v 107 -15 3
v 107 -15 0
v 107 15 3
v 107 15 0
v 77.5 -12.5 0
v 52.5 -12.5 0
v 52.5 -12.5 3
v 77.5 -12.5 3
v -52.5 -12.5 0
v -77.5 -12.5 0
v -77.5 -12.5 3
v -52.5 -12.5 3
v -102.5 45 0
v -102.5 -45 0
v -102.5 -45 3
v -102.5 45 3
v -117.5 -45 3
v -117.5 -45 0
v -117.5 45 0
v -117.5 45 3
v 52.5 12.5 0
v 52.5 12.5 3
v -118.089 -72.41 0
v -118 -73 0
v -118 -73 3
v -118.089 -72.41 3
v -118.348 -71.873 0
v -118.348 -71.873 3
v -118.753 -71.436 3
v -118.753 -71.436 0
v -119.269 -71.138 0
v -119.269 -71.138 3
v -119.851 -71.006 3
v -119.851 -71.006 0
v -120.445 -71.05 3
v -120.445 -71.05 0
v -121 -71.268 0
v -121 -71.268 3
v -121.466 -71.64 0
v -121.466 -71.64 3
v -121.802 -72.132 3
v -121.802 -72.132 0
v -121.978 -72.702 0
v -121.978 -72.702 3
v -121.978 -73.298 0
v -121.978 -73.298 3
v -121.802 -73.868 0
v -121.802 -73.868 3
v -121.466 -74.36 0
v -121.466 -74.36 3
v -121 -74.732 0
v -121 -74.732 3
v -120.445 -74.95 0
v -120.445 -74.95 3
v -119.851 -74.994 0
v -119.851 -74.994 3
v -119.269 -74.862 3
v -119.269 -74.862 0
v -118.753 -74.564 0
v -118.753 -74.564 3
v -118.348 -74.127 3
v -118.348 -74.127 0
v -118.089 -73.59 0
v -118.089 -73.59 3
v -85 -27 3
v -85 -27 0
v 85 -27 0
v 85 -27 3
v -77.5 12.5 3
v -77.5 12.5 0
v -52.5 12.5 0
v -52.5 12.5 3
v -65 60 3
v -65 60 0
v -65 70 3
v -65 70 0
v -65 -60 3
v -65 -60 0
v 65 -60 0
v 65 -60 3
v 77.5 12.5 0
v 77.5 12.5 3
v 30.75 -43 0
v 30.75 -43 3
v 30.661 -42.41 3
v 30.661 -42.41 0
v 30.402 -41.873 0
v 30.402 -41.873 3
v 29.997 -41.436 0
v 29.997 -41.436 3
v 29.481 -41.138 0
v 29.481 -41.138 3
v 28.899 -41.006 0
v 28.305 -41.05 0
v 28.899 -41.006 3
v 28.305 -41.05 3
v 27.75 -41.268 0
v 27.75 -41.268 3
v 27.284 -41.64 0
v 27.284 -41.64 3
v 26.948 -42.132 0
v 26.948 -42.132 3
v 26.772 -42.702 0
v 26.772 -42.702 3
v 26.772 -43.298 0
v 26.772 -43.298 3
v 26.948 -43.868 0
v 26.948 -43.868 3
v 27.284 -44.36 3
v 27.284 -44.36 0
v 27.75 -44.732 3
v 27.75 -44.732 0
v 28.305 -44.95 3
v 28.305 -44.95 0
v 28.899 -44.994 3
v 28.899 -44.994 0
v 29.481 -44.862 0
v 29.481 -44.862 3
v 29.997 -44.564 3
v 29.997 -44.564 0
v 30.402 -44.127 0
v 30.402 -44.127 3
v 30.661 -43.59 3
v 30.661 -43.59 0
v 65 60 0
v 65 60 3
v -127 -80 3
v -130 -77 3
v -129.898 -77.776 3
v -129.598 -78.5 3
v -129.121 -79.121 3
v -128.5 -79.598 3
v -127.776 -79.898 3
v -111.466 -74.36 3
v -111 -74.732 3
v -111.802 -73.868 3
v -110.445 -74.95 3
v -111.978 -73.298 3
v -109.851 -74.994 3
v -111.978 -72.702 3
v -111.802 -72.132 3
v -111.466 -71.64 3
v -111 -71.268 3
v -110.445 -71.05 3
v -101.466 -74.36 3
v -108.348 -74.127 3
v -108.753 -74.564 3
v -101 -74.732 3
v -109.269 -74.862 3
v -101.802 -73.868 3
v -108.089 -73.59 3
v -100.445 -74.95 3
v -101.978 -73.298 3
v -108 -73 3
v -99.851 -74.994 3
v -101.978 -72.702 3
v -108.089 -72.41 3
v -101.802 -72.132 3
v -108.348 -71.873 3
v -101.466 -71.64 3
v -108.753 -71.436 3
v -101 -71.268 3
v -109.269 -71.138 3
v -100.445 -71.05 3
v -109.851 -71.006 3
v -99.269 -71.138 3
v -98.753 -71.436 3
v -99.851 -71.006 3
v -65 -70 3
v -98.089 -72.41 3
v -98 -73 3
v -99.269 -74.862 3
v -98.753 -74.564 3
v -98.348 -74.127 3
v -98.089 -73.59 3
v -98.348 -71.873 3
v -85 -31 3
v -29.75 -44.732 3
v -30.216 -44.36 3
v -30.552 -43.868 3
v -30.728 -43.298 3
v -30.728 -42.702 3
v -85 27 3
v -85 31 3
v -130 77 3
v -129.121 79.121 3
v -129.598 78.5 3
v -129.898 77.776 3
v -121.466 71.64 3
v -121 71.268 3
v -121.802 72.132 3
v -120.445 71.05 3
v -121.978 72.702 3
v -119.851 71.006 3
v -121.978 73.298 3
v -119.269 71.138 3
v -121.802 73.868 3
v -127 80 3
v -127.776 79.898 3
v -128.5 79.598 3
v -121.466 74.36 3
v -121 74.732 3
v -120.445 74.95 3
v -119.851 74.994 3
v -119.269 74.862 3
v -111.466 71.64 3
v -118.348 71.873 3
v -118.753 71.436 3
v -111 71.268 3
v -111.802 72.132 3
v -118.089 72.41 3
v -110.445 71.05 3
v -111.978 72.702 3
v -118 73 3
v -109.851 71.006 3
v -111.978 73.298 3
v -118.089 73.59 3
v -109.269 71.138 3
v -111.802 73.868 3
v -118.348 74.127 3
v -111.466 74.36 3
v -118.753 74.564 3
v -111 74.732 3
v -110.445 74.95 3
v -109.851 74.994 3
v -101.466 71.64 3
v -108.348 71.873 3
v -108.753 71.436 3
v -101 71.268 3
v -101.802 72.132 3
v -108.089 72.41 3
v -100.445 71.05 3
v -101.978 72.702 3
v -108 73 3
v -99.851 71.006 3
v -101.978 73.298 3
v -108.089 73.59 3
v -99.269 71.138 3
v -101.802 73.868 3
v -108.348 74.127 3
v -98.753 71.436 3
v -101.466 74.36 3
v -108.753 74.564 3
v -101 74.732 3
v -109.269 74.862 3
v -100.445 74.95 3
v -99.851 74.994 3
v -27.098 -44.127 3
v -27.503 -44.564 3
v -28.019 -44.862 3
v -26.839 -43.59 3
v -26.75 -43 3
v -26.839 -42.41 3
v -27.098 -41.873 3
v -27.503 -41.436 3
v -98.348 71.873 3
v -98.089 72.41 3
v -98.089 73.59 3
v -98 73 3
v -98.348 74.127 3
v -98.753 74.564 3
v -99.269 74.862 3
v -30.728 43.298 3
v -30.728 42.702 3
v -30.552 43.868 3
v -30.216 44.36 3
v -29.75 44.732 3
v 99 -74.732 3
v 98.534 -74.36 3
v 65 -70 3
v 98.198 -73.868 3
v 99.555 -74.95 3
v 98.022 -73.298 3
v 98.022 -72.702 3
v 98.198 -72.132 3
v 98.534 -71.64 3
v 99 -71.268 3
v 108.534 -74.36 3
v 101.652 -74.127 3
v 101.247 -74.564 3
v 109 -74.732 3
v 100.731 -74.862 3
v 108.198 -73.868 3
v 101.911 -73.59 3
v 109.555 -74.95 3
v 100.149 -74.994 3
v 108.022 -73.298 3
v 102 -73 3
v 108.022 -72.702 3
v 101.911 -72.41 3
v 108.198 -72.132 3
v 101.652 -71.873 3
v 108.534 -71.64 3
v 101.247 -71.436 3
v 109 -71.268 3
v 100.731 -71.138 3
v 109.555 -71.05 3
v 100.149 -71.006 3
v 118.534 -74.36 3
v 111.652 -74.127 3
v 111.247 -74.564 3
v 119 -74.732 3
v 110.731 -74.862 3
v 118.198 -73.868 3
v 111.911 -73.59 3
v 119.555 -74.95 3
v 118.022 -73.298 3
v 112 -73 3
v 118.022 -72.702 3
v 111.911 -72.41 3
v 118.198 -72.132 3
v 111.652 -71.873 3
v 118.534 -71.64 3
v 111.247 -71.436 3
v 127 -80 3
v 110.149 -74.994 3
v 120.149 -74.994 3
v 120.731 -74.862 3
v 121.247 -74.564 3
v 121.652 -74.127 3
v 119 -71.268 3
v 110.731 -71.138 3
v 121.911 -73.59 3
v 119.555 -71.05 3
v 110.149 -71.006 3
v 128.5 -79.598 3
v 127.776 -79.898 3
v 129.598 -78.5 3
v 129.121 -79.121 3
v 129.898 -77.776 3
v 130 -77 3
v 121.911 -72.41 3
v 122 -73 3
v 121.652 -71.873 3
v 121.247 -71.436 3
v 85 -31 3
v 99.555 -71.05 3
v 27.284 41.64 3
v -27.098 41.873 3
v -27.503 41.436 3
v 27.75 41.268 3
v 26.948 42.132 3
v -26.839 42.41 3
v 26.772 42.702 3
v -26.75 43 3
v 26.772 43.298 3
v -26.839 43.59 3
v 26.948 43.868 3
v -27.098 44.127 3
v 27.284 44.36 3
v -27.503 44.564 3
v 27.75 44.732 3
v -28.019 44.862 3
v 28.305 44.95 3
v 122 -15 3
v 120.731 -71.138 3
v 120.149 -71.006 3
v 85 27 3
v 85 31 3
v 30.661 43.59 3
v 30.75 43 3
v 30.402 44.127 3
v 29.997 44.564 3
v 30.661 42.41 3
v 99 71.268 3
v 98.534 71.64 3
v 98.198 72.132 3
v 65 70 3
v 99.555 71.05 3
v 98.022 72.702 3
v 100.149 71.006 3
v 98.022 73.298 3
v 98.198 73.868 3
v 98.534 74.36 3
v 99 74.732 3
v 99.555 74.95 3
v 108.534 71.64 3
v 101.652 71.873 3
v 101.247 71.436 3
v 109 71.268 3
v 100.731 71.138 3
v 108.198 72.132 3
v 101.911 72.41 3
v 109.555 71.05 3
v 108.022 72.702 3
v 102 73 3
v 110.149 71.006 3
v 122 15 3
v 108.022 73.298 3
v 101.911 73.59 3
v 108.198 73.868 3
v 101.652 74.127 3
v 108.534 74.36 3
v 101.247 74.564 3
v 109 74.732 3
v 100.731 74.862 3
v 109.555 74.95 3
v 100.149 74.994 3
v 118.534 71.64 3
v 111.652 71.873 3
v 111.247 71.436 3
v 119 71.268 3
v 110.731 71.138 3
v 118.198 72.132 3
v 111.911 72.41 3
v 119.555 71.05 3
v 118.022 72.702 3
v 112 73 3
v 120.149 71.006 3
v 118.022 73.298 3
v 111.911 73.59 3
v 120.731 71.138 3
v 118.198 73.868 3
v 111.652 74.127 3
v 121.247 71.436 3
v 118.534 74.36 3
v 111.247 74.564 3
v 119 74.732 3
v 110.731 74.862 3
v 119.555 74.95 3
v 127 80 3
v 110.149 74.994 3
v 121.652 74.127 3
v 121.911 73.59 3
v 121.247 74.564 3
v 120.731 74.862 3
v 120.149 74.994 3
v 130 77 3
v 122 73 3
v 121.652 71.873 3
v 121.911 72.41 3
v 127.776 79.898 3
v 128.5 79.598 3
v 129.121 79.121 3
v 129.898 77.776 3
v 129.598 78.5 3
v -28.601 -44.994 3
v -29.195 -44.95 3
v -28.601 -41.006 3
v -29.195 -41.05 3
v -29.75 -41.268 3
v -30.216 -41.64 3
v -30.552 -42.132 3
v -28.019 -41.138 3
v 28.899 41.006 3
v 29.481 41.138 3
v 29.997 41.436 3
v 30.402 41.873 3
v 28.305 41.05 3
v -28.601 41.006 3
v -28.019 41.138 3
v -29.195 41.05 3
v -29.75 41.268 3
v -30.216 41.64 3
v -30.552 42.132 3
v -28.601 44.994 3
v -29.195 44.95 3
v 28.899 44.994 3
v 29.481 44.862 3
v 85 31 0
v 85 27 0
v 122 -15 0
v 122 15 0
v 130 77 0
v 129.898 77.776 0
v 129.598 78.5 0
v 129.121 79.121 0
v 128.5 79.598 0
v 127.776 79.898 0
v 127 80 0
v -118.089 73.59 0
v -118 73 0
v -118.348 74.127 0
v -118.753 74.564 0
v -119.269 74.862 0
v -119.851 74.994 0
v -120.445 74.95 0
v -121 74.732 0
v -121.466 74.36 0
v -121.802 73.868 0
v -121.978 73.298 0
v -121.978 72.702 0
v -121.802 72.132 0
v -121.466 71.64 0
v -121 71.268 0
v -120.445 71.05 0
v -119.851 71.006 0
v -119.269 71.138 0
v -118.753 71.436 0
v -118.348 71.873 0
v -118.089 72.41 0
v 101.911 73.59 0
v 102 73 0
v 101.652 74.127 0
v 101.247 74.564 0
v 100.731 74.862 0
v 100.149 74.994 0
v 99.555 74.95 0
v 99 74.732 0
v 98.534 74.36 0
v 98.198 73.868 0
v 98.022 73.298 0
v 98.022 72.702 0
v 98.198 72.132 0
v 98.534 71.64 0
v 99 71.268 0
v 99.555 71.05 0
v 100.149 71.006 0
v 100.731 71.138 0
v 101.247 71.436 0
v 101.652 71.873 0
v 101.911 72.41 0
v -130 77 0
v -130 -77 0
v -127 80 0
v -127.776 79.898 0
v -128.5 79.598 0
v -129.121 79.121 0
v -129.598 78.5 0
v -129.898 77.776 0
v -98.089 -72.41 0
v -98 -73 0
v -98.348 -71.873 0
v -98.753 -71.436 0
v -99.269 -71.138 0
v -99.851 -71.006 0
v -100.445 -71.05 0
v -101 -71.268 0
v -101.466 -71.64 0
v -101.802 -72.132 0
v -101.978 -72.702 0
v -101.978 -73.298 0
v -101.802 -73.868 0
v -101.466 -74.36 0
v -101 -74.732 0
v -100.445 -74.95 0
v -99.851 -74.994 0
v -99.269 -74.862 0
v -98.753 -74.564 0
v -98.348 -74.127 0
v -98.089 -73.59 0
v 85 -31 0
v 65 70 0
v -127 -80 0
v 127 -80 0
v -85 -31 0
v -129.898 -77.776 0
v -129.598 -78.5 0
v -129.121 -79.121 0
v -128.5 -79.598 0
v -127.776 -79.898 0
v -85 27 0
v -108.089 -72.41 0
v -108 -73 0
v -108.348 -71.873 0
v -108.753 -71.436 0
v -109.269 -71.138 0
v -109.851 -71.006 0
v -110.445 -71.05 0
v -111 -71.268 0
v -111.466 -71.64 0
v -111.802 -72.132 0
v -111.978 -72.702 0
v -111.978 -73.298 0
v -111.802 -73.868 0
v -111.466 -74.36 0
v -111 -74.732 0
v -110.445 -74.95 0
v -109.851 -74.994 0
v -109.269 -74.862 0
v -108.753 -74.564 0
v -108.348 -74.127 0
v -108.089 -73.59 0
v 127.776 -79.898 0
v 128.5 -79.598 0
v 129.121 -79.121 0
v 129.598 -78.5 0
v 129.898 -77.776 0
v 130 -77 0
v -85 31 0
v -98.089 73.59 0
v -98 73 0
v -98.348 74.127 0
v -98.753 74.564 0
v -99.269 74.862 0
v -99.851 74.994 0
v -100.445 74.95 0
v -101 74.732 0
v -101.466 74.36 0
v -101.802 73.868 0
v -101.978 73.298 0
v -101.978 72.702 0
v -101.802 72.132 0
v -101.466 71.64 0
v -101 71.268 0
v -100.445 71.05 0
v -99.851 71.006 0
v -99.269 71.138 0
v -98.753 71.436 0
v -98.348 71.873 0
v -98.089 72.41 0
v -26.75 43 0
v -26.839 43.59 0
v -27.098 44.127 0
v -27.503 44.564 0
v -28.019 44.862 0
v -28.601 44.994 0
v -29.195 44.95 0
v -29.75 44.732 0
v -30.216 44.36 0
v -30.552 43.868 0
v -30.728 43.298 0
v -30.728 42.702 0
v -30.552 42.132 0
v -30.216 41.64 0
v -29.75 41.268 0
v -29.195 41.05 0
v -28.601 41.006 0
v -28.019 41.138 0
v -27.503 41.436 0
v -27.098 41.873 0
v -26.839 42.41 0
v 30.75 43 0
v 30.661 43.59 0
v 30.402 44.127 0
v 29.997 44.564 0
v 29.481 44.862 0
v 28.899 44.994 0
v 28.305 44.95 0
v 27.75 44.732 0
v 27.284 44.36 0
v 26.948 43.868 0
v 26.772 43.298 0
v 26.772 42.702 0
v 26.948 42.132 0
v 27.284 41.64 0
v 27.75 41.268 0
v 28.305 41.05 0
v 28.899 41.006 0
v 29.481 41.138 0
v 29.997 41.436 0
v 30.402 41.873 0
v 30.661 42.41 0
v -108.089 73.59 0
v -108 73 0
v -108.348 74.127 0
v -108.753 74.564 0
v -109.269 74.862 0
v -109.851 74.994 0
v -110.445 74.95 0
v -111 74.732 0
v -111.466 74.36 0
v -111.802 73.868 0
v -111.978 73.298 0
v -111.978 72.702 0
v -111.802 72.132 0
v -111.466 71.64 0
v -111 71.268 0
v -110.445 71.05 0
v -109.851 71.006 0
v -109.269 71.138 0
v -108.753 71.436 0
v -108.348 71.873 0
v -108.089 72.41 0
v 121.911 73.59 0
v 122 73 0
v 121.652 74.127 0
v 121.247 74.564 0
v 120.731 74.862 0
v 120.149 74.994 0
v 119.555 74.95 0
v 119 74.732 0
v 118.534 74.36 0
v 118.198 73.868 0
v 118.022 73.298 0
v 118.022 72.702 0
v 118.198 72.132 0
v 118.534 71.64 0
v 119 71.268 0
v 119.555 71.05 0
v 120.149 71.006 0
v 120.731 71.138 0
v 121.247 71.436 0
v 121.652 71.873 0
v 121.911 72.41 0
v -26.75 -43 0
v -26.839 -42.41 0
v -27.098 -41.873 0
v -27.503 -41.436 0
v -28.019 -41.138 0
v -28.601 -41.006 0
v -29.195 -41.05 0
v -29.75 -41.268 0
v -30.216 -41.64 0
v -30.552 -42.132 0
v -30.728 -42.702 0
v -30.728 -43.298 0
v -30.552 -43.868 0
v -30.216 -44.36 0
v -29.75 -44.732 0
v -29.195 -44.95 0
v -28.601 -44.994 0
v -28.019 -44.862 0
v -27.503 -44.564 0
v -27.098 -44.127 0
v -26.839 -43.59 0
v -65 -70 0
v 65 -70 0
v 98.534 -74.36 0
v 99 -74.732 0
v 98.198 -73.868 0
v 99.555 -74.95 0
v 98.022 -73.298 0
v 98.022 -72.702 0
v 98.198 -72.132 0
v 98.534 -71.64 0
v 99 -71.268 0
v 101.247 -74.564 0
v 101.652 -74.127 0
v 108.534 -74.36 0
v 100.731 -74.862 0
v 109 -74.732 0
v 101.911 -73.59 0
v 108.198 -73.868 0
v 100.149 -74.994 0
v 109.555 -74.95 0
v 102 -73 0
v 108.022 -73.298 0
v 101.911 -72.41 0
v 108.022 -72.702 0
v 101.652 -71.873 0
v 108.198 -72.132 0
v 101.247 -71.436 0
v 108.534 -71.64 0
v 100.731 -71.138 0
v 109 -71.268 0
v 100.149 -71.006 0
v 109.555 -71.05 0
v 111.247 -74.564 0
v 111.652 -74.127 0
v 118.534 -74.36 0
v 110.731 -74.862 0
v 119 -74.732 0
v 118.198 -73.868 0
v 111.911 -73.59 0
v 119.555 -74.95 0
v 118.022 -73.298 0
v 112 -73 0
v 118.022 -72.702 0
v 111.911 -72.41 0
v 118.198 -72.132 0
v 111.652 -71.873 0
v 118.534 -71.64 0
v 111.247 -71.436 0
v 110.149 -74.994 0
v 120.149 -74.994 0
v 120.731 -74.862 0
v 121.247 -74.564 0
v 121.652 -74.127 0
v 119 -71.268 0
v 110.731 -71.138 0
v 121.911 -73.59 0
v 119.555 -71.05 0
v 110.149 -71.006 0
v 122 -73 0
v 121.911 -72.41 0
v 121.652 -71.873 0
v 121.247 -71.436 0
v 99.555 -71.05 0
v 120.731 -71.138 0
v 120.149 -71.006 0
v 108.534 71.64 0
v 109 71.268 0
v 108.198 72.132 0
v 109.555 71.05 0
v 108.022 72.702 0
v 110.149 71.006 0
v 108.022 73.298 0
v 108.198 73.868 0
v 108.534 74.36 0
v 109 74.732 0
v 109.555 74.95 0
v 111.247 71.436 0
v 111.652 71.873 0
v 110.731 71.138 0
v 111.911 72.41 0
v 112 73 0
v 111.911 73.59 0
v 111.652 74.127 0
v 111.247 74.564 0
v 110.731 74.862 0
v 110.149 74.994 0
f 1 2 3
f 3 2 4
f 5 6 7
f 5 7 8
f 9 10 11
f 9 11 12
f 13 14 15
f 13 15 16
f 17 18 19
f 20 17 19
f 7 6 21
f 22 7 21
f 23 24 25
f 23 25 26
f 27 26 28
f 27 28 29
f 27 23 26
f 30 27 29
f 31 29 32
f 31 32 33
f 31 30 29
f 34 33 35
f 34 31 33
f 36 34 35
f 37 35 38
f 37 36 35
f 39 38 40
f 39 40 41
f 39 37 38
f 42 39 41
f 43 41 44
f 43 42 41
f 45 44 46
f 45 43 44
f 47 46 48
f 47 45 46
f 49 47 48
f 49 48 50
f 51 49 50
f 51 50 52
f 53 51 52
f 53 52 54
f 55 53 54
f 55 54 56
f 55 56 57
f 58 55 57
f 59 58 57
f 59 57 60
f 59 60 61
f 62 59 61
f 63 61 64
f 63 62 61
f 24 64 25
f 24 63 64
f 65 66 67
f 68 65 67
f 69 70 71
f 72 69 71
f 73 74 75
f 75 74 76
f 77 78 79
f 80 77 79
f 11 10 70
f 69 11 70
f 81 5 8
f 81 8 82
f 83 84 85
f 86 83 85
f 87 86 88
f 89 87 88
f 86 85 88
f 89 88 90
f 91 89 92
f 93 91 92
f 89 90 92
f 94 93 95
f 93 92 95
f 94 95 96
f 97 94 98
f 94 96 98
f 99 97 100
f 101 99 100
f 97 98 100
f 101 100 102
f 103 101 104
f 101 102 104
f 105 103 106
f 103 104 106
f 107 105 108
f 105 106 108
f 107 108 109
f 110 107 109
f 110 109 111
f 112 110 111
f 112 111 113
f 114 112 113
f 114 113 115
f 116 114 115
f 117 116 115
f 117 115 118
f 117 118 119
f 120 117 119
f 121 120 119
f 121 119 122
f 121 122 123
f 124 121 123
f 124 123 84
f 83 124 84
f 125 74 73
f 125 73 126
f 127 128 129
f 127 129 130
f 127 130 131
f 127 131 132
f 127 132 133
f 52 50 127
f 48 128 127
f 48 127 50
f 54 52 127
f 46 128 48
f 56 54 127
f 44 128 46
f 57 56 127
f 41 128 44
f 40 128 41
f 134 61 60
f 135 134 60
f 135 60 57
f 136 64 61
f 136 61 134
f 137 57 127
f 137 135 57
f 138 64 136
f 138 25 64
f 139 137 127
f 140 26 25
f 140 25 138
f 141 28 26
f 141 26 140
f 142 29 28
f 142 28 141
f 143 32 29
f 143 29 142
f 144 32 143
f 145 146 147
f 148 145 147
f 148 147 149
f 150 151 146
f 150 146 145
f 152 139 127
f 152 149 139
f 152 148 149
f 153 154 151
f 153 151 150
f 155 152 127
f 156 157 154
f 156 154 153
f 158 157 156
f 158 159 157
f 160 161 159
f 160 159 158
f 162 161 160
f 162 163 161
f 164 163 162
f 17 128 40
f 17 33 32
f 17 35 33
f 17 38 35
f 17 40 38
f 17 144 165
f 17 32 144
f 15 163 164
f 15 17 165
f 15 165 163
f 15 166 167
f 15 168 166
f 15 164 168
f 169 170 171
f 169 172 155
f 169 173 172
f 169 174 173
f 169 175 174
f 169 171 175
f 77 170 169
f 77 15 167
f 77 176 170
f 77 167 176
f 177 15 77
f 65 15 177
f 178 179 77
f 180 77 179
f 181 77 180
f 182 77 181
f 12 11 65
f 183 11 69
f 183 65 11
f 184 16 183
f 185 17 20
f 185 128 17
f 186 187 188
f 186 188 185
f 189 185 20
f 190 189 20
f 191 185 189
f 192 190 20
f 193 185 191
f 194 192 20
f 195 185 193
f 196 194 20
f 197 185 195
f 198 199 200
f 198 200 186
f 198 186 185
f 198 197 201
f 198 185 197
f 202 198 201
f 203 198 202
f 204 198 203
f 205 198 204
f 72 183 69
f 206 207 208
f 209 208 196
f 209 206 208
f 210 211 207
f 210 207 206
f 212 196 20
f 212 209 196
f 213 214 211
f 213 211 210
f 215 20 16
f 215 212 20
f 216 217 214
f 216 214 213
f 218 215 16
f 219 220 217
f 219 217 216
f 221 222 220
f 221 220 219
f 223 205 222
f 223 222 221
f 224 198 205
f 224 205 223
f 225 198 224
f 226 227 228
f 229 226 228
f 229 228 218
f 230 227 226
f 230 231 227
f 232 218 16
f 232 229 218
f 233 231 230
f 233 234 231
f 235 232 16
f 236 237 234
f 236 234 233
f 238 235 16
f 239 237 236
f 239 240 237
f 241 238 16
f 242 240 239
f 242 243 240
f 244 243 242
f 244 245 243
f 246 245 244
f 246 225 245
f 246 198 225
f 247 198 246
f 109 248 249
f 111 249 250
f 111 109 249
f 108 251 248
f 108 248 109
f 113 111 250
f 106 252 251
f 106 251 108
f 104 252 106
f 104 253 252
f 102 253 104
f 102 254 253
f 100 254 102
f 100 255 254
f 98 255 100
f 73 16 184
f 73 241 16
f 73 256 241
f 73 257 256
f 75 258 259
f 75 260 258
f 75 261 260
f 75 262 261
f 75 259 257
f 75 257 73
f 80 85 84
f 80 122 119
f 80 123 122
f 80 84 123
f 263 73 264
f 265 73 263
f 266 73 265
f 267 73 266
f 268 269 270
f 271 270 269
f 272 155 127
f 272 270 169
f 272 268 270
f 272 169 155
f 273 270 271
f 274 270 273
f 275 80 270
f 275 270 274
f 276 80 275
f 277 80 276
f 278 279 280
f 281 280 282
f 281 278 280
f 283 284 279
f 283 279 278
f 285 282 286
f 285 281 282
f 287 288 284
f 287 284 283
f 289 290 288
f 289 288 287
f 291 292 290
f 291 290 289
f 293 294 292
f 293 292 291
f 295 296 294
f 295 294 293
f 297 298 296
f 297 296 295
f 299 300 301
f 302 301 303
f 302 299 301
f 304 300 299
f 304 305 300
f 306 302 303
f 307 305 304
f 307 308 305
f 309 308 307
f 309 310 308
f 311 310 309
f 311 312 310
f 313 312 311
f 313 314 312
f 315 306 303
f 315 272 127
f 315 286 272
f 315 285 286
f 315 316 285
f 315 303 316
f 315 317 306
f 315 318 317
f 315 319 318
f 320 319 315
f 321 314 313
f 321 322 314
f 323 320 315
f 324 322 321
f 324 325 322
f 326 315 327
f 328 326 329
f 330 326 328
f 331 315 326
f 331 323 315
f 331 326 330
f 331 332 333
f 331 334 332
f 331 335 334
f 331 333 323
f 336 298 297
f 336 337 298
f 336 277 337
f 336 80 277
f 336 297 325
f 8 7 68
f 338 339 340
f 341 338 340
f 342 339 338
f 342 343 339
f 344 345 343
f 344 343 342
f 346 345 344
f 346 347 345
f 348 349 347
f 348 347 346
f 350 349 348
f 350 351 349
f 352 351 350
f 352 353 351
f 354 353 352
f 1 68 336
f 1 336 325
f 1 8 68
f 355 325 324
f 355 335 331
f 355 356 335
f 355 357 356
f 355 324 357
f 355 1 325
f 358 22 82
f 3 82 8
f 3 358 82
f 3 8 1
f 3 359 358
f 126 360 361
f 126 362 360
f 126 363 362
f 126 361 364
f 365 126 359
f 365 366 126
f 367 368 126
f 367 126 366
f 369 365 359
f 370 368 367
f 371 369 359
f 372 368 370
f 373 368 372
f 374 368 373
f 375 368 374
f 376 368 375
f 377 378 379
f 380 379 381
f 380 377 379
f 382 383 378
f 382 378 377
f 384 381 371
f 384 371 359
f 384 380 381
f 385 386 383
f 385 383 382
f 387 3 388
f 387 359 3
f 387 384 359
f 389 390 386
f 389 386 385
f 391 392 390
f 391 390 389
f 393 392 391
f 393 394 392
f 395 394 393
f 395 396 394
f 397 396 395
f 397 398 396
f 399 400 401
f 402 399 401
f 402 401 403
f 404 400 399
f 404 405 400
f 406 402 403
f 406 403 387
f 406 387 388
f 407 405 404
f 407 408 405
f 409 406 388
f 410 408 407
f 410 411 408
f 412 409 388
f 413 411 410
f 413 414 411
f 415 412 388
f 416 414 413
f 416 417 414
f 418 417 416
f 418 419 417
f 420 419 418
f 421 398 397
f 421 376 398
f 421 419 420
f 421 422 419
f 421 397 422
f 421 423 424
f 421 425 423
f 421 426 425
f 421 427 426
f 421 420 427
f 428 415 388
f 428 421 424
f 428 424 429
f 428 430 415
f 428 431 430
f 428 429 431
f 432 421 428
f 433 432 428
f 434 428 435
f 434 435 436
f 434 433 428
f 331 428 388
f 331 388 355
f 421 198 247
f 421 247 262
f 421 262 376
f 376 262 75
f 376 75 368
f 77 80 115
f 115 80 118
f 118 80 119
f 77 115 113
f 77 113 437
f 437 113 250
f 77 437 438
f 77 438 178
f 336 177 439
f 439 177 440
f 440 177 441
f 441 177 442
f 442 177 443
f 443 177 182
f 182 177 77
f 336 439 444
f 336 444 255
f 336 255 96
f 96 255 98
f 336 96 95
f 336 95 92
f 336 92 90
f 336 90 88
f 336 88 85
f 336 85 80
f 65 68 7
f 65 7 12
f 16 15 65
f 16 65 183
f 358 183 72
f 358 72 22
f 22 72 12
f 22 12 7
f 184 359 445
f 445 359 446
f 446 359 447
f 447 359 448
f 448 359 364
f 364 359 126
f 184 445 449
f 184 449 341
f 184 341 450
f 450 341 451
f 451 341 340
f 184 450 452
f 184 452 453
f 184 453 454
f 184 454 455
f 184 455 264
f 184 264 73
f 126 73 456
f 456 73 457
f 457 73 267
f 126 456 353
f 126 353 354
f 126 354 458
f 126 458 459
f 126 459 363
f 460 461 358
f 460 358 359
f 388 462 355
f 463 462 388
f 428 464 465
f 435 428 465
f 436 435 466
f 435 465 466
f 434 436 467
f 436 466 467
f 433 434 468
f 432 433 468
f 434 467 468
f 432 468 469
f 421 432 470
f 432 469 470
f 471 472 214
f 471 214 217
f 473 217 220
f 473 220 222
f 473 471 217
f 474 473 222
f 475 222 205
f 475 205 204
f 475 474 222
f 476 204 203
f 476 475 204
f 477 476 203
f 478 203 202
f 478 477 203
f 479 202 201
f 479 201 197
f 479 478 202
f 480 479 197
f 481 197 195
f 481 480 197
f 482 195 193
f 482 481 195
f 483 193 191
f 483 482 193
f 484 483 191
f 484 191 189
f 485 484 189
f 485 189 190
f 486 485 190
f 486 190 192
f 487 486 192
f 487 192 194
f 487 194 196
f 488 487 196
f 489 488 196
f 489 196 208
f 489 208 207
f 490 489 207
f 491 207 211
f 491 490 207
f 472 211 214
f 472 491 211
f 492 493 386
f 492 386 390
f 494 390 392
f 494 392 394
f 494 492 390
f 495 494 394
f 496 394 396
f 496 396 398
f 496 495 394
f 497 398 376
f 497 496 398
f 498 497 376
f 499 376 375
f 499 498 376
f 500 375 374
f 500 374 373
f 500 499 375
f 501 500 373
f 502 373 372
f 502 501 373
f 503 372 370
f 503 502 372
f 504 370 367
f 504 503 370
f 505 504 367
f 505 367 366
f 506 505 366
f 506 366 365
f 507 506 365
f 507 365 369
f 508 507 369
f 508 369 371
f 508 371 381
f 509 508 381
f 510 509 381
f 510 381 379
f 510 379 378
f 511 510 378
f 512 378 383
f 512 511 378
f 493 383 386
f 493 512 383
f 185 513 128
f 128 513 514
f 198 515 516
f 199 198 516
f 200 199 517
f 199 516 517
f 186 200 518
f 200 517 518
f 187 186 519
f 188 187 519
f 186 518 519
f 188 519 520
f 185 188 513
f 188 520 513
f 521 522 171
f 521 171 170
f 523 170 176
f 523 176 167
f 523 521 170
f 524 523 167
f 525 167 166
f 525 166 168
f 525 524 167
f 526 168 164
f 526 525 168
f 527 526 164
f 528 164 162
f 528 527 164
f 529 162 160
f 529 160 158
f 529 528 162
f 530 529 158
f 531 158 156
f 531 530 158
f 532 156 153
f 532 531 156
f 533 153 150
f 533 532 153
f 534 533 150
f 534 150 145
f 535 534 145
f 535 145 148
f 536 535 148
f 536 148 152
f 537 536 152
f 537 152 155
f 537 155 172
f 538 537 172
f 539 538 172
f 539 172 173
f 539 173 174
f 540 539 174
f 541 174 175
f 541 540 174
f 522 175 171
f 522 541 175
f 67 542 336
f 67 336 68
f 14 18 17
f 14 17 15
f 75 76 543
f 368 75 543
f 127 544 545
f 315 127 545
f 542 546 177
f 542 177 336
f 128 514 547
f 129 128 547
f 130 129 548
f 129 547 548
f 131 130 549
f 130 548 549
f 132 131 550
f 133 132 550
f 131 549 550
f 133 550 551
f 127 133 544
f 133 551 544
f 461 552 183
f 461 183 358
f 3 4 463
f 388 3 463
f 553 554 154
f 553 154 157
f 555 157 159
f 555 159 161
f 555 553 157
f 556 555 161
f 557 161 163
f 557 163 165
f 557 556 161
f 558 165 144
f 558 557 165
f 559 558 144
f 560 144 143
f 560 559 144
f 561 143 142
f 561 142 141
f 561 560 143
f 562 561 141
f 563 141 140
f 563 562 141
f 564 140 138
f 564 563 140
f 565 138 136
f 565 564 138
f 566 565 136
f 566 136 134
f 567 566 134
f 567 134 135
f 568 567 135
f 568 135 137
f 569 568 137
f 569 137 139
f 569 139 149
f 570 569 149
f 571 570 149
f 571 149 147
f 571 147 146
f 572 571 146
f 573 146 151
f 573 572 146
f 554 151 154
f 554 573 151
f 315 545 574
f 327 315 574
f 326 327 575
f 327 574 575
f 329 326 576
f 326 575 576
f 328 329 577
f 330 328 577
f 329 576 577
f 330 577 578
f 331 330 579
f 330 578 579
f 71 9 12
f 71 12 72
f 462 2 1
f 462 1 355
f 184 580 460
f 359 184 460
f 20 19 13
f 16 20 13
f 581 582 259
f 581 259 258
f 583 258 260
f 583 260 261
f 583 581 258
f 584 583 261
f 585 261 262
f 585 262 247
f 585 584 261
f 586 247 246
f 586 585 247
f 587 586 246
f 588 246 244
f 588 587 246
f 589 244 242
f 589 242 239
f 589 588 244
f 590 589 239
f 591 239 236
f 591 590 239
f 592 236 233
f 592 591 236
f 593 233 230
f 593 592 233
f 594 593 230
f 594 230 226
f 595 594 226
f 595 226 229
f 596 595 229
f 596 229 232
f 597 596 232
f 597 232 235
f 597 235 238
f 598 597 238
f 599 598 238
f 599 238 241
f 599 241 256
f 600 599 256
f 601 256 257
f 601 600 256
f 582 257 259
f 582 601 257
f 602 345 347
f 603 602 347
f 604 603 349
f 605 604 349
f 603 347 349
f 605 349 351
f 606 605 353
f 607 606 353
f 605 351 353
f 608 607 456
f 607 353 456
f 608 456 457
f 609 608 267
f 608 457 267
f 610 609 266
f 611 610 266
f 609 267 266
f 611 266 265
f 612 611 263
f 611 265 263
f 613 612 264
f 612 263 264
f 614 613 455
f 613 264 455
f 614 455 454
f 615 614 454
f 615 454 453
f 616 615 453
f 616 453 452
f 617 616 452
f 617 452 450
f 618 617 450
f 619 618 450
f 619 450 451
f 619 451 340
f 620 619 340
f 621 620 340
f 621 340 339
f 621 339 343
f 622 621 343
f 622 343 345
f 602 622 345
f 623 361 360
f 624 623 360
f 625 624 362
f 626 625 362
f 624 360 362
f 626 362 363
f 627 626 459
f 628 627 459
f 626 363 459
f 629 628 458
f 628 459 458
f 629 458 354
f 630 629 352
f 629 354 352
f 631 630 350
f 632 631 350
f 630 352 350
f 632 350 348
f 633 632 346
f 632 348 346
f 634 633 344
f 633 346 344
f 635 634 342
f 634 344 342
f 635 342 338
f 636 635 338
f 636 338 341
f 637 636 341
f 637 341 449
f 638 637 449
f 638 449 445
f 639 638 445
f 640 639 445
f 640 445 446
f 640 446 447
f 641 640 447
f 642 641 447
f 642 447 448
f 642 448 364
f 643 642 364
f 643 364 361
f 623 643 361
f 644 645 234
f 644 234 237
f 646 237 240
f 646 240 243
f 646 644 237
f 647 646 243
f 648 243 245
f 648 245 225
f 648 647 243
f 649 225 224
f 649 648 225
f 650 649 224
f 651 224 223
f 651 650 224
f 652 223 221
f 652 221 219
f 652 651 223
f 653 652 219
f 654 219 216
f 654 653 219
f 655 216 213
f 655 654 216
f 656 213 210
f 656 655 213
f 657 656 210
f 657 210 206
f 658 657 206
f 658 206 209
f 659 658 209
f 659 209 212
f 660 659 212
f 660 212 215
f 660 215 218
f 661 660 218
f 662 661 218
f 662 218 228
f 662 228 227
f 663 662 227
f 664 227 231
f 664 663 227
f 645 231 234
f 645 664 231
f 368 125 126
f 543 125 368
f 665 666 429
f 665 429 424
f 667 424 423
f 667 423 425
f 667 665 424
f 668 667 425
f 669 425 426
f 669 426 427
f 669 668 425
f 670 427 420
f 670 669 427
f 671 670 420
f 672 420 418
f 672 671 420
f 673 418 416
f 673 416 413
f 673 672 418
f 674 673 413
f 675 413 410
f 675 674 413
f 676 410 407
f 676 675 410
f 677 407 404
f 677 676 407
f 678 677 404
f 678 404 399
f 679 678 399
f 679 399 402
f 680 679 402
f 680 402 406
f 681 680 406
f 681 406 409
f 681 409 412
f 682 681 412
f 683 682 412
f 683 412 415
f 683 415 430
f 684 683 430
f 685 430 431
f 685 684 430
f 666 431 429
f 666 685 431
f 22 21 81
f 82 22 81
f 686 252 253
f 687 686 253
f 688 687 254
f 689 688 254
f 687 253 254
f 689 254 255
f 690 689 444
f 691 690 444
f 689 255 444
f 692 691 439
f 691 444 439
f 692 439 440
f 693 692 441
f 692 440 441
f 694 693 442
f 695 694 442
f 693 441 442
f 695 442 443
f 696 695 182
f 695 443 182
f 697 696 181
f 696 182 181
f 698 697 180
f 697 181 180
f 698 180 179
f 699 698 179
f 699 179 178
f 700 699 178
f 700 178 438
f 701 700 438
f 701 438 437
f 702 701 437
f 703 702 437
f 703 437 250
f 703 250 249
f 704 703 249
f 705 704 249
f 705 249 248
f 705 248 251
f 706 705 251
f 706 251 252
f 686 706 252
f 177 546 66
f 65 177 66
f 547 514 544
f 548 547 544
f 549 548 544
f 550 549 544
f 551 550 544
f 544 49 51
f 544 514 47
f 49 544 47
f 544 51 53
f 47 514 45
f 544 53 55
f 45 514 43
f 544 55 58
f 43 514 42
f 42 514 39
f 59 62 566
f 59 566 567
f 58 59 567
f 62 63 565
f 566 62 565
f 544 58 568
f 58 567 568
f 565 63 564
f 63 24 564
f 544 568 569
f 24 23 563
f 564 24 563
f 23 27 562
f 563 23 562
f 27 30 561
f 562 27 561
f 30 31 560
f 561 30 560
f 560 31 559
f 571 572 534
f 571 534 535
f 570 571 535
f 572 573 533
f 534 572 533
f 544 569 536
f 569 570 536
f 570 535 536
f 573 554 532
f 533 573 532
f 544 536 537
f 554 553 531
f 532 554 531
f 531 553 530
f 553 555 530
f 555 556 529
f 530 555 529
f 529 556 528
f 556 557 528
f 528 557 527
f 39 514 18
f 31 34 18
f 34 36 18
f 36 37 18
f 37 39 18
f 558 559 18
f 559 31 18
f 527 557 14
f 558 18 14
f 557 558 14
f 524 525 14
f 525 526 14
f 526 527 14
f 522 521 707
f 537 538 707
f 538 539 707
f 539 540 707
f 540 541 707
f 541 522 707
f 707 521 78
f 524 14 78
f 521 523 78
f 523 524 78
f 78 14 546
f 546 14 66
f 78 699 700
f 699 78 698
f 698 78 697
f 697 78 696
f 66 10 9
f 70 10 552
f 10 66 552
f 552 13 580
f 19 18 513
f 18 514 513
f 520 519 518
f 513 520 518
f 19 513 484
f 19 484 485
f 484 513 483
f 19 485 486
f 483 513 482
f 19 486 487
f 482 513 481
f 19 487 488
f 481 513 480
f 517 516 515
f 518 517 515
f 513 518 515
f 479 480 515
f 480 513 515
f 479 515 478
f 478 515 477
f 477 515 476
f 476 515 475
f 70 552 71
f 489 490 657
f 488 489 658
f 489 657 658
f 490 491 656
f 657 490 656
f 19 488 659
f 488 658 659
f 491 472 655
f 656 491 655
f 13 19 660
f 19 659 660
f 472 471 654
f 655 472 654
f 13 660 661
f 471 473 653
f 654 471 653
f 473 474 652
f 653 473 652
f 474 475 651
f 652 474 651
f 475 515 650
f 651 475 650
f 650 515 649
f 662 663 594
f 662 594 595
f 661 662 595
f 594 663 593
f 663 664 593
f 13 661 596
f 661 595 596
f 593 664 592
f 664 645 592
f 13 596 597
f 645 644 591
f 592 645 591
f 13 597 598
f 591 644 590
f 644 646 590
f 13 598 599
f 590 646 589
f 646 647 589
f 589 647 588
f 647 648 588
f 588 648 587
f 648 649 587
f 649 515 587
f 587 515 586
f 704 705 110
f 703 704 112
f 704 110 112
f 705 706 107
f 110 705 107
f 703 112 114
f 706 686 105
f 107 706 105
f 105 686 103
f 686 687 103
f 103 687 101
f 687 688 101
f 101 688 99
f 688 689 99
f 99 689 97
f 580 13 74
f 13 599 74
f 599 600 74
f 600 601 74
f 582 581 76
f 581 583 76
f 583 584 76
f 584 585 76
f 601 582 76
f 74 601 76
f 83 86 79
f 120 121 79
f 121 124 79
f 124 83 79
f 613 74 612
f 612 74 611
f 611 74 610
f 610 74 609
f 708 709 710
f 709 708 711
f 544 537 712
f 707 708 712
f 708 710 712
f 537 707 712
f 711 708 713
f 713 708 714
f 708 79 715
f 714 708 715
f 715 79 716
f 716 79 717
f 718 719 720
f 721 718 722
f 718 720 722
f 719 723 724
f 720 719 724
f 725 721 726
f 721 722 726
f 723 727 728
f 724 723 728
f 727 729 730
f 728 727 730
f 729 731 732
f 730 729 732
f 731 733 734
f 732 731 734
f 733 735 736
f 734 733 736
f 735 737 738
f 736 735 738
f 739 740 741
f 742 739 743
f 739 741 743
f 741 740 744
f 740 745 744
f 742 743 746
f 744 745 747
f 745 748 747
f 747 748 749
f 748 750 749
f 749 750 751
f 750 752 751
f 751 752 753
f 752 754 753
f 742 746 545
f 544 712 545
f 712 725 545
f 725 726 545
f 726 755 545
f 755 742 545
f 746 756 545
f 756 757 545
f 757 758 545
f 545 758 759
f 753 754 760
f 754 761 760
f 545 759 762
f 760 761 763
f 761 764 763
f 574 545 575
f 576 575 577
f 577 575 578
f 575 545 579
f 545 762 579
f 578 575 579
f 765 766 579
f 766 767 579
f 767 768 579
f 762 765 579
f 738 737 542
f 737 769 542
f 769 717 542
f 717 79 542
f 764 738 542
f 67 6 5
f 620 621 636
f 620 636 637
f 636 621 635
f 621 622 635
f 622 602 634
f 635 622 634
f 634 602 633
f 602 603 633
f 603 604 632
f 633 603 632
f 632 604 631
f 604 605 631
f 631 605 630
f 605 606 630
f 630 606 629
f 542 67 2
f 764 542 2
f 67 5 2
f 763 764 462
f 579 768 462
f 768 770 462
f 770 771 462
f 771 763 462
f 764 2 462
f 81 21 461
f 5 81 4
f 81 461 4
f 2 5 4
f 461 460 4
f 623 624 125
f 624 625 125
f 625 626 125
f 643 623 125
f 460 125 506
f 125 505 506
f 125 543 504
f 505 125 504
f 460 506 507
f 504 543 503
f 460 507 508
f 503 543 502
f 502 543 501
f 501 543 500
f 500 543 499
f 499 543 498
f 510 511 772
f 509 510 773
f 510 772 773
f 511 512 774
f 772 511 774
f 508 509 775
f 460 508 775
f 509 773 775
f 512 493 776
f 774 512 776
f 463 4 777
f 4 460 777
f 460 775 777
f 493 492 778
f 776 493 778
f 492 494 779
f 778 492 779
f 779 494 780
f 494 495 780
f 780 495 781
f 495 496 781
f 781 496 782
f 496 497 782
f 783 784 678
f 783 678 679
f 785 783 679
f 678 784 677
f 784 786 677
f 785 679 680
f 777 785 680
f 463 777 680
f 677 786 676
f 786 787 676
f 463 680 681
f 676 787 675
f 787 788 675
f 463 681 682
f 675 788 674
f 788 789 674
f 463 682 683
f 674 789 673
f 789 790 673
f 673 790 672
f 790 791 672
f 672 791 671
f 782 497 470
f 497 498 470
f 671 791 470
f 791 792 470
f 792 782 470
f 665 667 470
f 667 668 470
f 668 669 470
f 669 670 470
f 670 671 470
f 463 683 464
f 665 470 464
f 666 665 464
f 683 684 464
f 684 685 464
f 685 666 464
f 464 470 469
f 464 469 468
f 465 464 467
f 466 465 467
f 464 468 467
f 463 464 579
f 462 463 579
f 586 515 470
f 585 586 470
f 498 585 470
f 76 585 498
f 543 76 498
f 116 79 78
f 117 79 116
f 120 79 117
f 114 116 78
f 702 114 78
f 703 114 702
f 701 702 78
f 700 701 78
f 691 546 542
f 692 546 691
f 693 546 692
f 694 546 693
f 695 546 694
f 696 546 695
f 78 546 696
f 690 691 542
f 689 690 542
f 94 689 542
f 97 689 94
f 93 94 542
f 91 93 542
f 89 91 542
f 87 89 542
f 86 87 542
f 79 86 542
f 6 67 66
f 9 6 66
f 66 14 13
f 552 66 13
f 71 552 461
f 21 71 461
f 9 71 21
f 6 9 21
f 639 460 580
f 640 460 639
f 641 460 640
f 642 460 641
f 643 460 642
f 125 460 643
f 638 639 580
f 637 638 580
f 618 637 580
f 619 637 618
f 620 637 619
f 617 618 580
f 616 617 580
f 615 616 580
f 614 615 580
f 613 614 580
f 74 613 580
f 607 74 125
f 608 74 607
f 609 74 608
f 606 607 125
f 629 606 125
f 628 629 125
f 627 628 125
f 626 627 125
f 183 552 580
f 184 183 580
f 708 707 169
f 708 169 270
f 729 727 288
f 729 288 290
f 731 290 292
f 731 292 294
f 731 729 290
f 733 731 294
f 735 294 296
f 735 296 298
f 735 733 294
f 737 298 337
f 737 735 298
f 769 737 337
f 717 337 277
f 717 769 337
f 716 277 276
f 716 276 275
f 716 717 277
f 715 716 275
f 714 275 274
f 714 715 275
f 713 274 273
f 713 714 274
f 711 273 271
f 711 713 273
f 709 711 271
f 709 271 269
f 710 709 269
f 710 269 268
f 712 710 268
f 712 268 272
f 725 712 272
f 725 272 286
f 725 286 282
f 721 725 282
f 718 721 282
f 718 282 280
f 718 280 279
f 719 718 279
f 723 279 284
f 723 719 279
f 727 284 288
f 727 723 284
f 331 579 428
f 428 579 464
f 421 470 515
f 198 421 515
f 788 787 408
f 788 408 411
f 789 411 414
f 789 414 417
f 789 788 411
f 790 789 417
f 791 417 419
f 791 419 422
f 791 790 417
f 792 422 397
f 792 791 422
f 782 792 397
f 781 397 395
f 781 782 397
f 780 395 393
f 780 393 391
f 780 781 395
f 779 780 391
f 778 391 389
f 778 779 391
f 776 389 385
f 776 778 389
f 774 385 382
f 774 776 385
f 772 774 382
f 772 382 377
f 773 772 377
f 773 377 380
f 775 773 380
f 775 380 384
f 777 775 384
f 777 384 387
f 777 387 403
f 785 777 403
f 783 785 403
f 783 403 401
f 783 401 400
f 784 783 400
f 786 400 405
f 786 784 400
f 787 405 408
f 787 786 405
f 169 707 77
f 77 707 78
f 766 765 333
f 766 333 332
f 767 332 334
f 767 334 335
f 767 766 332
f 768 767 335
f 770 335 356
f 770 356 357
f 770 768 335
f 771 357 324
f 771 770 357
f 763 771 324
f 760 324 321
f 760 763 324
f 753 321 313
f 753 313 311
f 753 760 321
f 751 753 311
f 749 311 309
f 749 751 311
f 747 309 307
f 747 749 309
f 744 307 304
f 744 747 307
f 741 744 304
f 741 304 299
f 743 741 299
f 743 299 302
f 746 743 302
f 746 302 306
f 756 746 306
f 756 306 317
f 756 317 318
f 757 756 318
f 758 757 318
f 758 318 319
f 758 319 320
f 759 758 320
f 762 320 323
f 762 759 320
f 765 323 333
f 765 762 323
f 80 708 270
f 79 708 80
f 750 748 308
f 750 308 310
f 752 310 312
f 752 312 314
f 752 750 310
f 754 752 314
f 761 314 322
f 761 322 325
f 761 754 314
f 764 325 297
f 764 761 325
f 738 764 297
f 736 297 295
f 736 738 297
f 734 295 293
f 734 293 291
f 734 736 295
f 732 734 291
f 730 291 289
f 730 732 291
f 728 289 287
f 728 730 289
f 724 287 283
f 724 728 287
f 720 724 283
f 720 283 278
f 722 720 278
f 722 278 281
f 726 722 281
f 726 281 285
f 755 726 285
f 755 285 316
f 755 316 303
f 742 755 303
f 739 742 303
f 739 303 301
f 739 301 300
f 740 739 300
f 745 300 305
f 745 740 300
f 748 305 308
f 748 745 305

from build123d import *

# Parameters (mm, degrees)
MODEL_R             = 2
MODEL_W             = 130
MODEL_H             = 10
MODEL_W_2           = 15
MODEL_H_2           = 90
MODEL_W_3           = 25
MODEL_H_3           = 25
MODEL_H_4           = 30
MODEL_W_4           = 170
MODEL_H_5           = 4
EXTRUDE_1_DEPTH     = 3
SKETCH_1_R          = 2
CUT_EXTRUDE_1_DEPTH = 10


with BuildPart() as part:
    # Model → 凸台-拉伸1 (new body)
    with BuildSketch(Plane.XY):
        with BuildLine():
            Line((130, -77), (130, 77))
            ThreePointArc((130, 77), (129.121320344, 79.121320344), (127, 80))
            Line((127, 80), (-127, 80))
            ThreePointArc((-127, 80), (-129.121320344, 79.121320344), (-130, 77))
            Line((-130, 77), (-130, -77))
            ThreePointArc((-130, -77), (-129.121320344, -79.121320344), (-127, -80))
            Line((-127, -80), (127, -80))
            ThreePointArc((127, -80), (129.121320344, -79.121320344), (130, -77))
        make_face()
        with Locations((-110, 73)):
            Circle(MODEL_R, mode=Mode.SUBTRACT)
        with Locations((110, 73)):
            Circle(MODEL_R, mode=Mode.SUBTRACT)
        with Locations((110, -73)):
            Circle(MODEL_R, mode=Mode.SUBTRACT)
        with Locations((-110, -73)):
            Circle(MODEL_R, mode=Mode.SUBTRACT)
        with Locations((-120, 73)):
            Circle(MODEL_R, mode=Mode.SUBTRACT)
        with Locations((120, 73)):
            Circle(MODEL_R, mode=Mode.SUBTRACT)
        with Locations((-120, -73)):
            Circle(MODEL_R, mode=Mode.SUBTRACT)
        with Locations((120, -73)):
            Circle(MODEL_R, mode=Mode.SUBTRACT)
        with Locations((-100, 73)):
            Circle(MODEL_R, mode=Mode.SUBTRACT)
        with Locations((100, 73)):
            Circle(MODEL_R, mode=Mode.SUBTRACT)
        with Locations((-100, -73)):
            Circle(MODEL_R, mode=Mode.SUBTRACT)
        with Locations((100, -73)):
            Circle(MODEL_R, mode=Mode.SUBTRACT)
        with Locations((0, 65)):
            Rectangle(MODEL_W, MODEL_H, mode=Mode.SUBTRACT)
        with Locations((0, -65)):
            Rectangle(MODEL_W, MODEL_H, mode=Mode.SUBTRACT)
        with Locations((-110, 0)):
            Rectangle(MODEL_W_2, MODEL_H_2, mode=Mode.SUBTRACT)
        with Locations((65, 0)):
            Rectangle(MODEL_W_3, MODEL_H_3, mode=Mode.SUBTRACT)
        with Locations((-65, 0)):
            Rectangle(MODEL_W_3, MODEL_H_3, mode=Mode.SUBTRACT)
        with Locations((114.5, 0)):
            Rectangle(MODEL_W_2, MODEL_H_4, mode=Mode.SUBTRACT)
        with Locations((0, 29)):
            Rectangle(MODEL_W_4, MODEL_H_5, mode=Mode.SUBTRACT)
        with Locations((0, -29)):
            Rectangle(MODEL_W_4, MODEL_H_5, mode=Mode.SUBTRACT)
    extrude(amount=EXTRUDE_1_DEPTH)

    # 草图1 → 切除-拉伸1 (cut)
    with BuildSketch(Plane.XY.offset(3)):
        with Locations((-28.75, 43)):
            Circle(SKETCH_1_R)
        with Locations((28.75, 43)):
            Circle(SKETCH_1_R)
        with Locations((-28.75, -43)):
            Circle(SKETCH_1_R)
        with Locations((28.75, -43)):
            Circle(SKETCH_1_R)
    extrude(amount=-CUT_EXTRUDE_1_DEPTH, mode=Mode.SUBTRACT)


solid = part.part
